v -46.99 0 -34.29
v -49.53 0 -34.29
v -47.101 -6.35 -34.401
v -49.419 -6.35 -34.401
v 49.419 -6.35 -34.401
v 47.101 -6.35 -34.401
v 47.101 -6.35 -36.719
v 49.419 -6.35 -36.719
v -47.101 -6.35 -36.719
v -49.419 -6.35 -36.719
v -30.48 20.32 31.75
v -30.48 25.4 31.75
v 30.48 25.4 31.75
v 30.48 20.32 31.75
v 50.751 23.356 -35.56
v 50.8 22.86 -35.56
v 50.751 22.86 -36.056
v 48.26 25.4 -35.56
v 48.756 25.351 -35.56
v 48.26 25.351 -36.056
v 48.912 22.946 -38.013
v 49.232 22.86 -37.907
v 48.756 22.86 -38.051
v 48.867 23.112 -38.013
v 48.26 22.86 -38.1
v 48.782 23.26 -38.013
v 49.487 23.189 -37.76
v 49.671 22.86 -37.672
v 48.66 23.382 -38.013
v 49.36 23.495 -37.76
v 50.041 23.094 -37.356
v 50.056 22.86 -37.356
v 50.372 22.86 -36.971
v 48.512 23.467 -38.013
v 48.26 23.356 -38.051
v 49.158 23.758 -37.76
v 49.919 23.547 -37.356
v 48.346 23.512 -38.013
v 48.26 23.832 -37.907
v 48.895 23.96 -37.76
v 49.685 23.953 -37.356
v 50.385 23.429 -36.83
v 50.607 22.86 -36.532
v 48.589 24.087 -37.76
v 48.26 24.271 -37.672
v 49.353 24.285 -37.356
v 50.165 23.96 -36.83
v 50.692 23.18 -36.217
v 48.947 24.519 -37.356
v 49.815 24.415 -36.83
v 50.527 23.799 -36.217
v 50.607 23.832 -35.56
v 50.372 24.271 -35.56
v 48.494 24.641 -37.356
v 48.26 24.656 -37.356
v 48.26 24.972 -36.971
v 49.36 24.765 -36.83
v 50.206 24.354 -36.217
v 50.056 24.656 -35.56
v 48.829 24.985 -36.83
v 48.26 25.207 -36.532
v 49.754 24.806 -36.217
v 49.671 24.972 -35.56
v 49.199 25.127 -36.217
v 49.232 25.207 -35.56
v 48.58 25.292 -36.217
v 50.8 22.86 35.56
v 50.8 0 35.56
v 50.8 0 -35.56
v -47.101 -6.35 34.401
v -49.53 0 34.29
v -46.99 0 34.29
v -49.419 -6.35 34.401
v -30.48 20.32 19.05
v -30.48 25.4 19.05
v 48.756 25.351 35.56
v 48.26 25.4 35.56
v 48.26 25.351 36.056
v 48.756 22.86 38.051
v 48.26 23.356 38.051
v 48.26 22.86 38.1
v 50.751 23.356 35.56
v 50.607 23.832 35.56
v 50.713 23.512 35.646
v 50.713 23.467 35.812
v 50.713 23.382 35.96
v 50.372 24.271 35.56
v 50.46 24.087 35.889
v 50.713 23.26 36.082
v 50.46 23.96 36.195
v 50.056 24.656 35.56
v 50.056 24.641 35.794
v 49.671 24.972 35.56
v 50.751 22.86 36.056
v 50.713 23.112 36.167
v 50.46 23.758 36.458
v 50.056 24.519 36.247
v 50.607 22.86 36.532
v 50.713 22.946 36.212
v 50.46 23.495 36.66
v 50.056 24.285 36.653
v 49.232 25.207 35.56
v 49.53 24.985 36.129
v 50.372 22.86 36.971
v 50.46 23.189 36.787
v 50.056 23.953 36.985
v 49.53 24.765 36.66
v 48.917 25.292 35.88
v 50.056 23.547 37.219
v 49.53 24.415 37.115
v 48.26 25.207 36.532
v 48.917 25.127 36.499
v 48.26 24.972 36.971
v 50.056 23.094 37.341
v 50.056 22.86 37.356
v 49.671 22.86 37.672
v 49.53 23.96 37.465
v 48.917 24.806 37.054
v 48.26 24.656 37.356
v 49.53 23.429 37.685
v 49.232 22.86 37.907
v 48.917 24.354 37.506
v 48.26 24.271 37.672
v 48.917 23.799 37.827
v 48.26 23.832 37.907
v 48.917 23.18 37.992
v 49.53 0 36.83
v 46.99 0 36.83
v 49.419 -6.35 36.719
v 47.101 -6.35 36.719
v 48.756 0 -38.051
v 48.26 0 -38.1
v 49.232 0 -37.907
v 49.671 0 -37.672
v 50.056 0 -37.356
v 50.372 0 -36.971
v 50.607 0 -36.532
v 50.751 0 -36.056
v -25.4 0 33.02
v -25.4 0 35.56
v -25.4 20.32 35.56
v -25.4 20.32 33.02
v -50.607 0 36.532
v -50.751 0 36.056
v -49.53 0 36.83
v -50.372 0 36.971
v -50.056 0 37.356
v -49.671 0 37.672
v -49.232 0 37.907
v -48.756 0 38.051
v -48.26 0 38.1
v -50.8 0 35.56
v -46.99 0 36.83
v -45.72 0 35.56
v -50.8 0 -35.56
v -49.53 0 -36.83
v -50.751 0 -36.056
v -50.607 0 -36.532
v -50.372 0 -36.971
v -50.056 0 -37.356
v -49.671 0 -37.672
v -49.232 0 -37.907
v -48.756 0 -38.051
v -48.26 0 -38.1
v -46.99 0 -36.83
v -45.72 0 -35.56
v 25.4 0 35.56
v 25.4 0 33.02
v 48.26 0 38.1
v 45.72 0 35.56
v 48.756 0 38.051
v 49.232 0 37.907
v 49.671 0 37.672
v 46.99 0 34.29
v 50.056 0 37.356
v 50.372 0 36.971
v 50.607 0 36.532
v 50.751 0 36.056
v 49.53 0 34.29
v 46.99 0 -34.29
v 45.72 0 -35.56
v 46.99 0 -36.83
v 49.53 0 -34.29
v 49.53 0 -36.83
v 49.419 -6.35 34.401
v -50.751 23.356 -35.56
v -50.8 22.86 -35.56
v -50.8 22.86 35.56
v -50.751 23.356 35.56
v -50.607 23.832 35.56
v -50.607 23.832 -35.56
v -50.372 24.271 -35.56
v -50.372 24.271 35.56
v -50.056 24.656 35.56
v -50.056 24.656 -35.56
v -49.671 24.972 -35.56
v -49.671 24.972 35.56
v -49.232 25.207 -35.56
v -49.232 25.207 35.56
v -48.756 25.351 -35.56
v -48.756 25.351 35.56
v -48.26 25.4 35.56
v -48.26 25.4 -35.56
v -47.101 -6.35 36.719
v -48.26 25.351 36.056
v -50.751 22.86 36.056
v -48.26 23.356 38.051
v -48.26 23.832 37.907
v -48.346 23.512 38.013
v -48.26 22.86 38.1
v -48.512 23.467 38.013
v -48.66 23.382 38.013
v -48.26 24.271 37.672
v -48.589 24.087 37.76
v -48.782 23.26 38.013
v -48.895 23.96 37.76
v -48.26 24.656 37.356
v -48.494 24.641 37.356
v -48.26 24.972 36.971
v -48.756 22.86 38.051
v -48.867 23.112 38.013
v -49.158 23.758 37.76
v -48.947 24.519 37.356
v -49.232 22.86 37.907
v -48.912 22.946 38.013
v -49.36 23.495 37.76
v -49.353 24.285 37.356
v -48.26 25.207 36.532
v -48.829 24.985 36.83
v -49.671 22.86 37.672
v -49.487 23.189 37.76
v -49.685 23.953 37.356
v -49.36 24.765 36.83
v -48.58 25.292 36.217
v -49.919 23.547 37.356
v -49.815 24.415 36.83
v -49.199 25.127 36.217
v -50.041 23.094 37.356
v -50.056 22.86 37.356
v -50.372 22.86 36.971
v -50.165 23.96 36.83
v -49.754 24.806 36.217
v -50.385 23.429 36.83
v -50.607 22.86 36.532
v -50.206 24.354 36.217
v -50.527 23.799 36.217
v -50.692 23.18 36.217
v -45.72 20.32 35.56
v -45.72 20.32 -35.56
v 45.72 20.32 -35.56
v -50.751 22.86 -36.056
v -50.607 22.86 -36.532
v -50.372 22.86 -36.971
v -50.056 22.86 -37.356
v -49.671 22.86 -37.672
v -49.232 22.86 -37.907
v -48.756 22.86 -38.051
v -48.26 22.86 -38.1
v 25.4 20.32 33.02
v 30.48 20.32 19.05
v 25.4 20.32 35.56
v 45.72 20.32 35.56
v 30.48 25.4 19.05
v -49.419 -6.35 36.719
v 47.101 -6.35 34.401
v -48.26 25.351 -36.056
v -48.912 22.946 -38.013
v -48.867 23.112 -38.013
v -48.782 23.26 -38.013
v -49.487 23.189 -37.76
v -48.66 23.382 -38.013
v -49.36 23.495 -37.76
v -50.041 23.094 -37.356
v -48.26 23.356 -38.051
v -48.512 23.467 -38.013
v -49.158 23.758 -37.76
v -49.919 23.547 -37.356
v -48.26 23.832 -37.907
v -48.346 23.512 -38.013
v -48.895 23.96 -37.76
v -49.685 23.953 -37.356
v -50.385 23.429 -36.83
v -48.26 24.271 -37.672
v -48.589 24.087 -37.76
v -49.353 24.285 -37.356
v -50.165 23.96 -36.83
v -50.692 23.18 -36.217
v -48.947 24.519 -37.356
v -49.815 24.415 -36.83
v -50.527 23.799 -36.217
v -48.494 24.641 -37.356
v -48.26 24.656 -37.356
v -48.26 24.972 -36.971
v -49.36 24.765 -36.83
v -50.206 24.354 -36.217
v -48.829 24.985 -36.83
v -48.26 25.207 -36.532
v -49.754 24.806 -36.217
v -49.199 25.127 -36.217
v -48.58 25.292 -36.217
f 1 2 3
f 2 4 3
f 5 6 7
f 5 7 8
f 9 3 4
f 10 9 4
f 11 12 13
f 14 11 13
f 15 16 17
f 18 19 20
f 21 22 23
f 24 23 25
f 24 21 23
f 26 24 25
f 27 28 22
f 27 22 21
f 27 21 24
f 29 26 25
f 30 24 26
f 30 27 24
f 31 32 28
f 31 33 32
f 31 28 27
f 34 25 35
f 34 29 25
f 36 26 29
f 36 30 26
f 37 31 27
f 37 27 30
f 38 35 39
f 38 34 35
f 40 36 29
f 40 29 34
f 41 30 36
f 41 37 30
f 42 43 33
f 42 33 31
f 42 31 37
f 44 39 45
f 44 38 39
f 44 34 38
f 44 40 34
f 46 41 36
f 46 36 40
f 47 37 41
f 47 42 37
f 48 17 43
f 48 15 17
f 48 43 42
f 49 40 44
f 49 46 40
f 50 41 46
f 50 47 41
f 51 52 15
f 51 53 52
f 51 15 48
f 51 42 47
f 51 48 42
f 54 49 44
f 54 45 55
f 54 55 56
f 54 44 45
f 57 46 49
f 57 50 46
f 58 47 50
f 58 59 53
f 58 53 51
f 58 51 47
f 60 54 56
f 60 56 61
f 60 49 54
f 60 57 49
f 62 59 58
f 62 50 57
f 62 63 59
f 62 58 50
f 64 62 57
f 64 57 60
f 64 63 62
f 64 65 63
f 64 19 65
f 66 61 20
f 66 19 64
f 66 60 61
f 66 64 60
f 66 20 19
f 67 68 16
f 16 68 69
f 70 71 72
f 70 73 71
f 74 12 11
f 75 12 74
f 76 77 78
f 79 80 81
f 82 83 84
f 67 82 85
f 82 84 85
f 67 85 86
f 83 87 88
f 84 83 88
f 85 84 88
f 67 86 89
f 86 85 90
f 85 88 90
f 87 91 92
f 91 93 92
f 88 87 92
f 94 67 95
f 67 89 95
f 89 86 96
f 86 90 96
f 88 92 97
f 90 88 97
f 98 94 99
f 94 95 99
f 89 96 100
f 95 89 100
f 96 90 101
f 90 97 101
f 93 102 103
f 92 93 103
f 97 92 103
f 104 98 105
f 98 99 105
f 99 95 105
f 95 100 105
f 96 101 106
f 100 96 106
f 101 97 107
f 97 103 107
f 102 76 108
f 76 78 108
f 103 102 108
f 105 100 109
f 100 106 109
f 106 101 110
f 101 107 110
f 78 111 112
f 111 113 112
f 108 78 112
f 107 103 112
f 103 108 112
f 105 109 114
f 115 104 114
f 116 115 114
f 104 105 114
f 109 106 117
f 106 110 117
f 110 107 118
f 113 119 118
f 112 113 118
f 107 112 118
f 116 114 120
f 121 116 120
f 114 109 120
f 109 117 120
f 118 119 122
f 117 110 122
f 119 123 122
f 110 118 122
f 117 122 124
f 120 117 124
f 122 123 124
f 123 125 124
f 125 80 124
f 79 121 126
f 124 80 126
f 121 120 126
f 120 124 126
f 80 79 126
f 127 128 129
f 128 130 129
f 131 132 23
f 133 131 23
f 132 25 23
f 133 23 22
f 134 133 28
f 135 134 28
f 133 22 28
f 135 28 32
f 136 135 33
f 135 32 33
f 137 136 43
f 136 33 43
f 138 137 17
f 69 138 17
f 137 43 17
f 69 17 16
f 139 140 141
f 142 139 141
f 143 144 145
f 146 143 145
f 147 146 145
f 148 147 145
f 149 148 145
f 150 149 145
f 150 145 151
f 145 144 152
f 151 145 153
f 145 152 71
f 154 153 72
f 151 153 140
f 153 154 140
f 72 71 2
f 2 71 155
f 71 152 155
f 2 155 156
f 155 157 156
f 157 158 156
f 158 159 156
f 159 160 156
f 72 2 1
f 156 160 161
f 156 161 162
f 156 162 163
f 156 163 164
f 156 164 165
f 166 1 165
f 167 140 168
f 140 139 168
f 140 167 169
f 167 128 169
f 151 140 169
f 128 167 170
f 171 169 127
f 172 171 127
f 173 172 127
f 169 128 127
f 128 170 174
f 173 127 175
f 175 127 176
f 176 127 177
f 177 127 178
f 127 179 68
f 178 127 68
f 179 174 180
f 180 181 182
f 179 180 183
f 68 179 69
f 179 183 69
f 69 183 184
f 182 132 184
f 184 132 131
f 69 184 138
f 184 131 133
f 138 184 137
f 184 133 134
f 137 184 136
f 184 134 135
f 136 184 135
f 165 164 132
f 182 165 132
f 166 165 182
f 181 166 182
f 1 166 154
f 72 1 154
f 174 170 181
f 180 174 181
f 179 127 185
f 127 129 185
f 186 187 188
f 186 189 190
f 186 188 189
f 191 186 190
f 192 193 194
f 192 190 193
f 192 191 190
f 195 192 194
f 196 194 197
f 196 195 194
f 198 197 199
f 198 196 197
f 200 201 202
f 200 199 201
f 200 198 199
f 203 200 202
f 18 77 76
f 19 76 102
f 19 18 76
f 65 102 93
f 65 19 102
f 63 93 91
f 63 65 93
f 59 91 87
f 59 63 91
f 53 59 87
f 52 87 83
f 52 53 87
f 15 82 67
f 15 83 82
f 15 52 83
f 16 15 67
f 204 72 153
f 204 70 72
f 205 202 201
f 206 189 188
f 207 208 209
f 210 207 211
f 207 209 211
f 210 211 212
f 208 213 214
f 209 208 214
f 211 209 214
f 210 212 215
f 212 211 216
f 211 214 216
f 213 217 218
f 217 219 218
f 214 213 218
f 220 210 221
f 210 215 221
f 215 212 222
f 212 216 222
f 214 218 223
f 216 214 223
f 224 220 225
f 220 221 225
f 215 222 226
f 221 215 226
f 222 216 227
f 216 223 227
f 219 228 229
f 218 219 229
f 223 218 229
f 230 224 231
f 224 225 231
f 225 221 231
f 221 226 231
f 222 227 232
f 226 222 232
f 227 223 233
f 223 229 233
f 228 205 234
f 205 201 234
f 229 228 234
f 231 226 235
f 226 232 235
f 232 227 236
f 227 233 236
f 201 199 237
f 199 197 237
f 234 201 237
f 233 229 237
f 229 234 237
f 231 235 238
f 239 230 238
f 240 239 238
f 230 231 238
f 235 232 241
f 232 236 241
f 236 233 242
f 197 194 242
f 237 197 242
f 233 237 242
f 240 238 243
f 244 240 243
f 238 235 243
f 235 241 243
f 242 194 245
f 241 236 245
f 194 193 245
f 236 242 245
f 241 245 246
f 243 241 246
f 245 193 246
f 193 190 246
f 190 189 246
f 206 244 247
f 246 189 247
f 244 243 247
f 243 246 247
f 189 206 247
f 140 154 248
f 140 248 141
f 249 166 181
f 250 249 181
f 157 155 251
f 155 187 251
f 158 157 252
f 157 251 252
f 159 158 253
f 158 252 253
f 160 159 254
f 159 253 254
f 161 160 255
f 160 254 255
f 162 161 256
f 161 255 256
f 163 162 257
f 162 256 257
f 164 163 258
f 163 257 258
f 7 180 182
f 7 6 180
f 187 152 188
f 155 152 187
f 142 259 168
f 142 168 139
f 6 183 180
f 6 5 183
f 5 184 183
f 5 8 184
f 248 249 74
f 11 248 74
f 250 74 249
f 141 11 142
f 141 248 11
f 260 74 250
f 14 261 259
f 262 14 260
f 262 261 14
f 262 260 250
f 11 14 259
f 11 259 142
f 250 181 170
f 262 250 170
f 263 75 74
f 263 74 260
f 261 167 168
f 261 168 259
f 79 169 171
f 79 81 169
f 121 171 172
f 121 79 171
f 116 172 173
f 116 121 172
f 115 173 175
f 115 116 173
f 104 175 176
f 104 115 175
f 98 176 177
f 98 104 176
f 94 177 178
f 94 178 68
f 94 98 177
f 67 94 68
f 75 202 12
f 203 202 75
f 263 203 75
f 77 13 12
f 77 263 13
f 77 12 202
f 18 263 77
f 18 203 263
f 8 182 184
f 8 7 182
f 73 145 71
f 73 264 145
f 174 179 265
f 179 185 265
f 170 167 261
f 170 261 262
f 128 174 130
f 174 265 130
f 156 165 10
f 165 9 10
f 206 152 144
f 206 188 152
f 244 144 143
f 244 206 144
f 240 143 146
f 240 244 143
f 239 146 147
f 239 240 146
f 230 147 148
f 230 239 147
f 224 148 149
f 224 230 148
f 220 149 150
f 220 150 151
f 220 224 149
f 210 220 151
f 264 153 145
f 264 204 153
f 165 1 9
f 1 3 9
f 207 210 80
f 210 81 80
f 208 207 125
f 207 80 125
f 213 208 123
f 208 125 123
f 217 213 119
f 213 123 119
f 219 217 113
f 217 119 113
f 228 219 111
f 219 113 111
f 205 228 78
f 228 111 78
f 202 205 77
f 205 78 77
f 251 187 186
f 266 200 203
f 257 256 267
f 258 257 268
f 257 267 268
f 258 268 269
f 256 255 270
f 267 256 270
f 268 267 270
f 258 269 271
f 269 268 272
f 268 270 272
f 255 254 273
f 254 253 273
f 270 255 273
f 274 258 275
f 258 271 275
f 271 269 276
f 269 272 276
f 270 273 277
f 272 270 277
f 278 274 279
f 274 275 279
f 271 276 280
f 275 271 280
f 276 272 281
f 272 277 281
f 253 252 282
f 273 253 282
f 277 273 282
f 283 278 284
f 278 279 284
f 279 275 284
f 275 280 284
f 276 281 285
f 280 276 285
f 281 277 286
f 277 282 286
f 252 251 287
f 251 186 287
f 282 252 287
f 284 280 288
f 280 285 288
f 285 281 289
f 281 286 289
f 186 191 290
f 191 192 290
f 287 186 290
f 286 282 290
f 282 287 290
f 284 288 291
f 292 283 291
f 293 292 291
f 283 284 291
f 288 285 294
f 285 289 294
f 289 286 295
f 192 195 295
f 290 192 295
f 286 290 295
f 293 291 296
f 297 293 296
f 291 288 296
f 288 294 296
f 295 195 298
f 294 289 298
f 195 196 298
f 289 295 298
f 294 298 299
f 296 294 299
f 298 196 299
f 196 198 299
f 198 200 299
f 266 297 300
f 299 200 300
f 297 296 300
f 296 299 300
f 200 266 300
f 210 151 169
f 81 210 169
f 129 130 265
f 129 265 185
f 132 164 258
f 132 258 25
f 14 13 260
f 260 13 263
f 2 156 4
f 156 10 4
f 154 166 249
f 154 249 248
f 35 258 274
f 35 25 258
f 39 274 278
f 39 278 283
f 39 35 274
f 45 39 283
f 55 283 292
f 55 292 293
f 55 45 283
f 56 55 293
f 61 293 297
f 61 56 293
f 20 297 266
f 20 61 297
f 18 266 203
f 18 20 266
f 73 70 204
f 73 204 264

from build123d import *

# Parameters (mm, degrees)
SKETCH1_W               = 101.6
SKETCH1_H               = 76.2
BOSS_EXTRUDE1_DEPTH     = 25.4
SKETCH5_W               = 91.44
SKETCH5_H               = 71.12
CUT_EXTRUDE1_DEPTH      = 20.32
FILLET1_R               = 2.54
SKETCH7_W               = 2.54
SKETCH7_H               = 2.54
BOSS_EXTRUDE2_DEPTH     = 6.35
BOSS_EXTRUDE2_TAPER     = 1
MIRROR4_COPY_1_SKETCH_W = 2.54
MIRROR4_COPY_1_SKETCH_H = 2.54
MIRROR4_COPY_1_DEPTH    = 6.35
MIRROR4_COPY_1_TAPER    = 1
SKETCH8_W               = 60.96
SKETCH8_H               = 12.7
CUT_EXTRUDE2_DEPTH      = 71.99515833
SKETCH9_W               = 50.8
SKETCH9_H               = 20.32
BOSS_EXTRUDE3_DEPTH     = 2.54


with BuildPart() as part:
    # Sketch1 → Boss-Extrude1 (new body)
    with BuildSketch(Plane(origin=(0, 0, 0), x_dir=(1, 0, 0), z_dir=(0, 1, 0))):
        Rectangle(SKETCH1_W, SKETCH1_H)
    extrude(amount=BOSS_EXTRUDE1_DEPTH)

    # Sketch5 → Cut-Extrude1 (cut)
    with BuildSketch(Plane.XZ):
        Rectangle(SKETCH5_W, SKETCH5_H)
    extrude(amount=-CUT_EXTRUDE1_DEPTH, mode=Mode.SUBTRACT)

    # Fillet1
    fillet1_edges = [part.edges().sort_by_distance(p)[0] for p in [
        (-50.8, 25.4, 0),
        (0, 25.4, 38.1),
        (50.8, 25.4, 0),
        (50.8, 12.7, 38.1),
        (-50.8, 12.7, 38.1),
        (-50.8, 12.7, -38.1),
        (50.8, 12.7, -38.1),
        (0, 25.4, -38.1),
    ]]
    fillet(fillet1_edges, radius=FILLET1_R)

    # Sketch7 → Boss-Extrude2 (add)
    with BuildSketch(Plane(origin=(0, 0, 0), x_dir=(-1, 0, 0), z_dir=(0, -1, 0))):
        with Locations((48.26, -35.56)):
            Rectangle(SKETCH7_W, SKETCH7_H)
    boss_extrude2 = extrude(amount=BOSS_EXTRUDE2_DEPTH, taper=BOSS_EXTRUDE2_TAPER)

    # Mirror3: Boss-Extrude2 across plane
    add(boss_extrude2.mirror(Plane(origin=(0, 0, 0), x_dir=(0, 0, 1), z_dir=(1, 0, 0))))

    # Mirror4: Boss-Extrude2 across plane
    add(boss_extrude2.mirror(Plane.XY))

    # Mirror4 copy 1 sketch → Mirror4 copy 1 (add)
    with BuildSketch(Plane.XZ):
        with Locations((48.26, -35.56)):
            Rectangle(MIRROR4_COPY_1_SKETCH_W, MIRROR4_COPY_1_SKETCH_H)
    extrude(amount=MIRROR4_COPY_1_DEPTH, taper=MIRROR4_COPY_1_TAPER)

    # Sketch8 → Cut-Extrude2 (cut, through all)
    with BuildSketch(Plane(origin=(0, 25.4, 0), x_dir=(1, 0, 0), z_dir=(0, 1, 0))):
        with Locations((0, -25.4)):
            Rectangle(SKETCH8_W, SKETCH8_H)
    extrude(amount=-CUT_EXTRUDE2_DEPTH, mode=Mode.SUBTRACT)

    # Sketch9 → Boss-Extrude3 (add)
    with BuildSketch(Plane(origin=(0, 0, 35.56), x_dir=(-1, 0, 0), z_dir=(0, 0, -1))):
        with Locations((0, 10.16)):
            Rectangle(SKETCH9_W, SKETCH9_H)
    extrude(amount=BOSS_EXTRUDE3_DEPTH)


solid = part.part
